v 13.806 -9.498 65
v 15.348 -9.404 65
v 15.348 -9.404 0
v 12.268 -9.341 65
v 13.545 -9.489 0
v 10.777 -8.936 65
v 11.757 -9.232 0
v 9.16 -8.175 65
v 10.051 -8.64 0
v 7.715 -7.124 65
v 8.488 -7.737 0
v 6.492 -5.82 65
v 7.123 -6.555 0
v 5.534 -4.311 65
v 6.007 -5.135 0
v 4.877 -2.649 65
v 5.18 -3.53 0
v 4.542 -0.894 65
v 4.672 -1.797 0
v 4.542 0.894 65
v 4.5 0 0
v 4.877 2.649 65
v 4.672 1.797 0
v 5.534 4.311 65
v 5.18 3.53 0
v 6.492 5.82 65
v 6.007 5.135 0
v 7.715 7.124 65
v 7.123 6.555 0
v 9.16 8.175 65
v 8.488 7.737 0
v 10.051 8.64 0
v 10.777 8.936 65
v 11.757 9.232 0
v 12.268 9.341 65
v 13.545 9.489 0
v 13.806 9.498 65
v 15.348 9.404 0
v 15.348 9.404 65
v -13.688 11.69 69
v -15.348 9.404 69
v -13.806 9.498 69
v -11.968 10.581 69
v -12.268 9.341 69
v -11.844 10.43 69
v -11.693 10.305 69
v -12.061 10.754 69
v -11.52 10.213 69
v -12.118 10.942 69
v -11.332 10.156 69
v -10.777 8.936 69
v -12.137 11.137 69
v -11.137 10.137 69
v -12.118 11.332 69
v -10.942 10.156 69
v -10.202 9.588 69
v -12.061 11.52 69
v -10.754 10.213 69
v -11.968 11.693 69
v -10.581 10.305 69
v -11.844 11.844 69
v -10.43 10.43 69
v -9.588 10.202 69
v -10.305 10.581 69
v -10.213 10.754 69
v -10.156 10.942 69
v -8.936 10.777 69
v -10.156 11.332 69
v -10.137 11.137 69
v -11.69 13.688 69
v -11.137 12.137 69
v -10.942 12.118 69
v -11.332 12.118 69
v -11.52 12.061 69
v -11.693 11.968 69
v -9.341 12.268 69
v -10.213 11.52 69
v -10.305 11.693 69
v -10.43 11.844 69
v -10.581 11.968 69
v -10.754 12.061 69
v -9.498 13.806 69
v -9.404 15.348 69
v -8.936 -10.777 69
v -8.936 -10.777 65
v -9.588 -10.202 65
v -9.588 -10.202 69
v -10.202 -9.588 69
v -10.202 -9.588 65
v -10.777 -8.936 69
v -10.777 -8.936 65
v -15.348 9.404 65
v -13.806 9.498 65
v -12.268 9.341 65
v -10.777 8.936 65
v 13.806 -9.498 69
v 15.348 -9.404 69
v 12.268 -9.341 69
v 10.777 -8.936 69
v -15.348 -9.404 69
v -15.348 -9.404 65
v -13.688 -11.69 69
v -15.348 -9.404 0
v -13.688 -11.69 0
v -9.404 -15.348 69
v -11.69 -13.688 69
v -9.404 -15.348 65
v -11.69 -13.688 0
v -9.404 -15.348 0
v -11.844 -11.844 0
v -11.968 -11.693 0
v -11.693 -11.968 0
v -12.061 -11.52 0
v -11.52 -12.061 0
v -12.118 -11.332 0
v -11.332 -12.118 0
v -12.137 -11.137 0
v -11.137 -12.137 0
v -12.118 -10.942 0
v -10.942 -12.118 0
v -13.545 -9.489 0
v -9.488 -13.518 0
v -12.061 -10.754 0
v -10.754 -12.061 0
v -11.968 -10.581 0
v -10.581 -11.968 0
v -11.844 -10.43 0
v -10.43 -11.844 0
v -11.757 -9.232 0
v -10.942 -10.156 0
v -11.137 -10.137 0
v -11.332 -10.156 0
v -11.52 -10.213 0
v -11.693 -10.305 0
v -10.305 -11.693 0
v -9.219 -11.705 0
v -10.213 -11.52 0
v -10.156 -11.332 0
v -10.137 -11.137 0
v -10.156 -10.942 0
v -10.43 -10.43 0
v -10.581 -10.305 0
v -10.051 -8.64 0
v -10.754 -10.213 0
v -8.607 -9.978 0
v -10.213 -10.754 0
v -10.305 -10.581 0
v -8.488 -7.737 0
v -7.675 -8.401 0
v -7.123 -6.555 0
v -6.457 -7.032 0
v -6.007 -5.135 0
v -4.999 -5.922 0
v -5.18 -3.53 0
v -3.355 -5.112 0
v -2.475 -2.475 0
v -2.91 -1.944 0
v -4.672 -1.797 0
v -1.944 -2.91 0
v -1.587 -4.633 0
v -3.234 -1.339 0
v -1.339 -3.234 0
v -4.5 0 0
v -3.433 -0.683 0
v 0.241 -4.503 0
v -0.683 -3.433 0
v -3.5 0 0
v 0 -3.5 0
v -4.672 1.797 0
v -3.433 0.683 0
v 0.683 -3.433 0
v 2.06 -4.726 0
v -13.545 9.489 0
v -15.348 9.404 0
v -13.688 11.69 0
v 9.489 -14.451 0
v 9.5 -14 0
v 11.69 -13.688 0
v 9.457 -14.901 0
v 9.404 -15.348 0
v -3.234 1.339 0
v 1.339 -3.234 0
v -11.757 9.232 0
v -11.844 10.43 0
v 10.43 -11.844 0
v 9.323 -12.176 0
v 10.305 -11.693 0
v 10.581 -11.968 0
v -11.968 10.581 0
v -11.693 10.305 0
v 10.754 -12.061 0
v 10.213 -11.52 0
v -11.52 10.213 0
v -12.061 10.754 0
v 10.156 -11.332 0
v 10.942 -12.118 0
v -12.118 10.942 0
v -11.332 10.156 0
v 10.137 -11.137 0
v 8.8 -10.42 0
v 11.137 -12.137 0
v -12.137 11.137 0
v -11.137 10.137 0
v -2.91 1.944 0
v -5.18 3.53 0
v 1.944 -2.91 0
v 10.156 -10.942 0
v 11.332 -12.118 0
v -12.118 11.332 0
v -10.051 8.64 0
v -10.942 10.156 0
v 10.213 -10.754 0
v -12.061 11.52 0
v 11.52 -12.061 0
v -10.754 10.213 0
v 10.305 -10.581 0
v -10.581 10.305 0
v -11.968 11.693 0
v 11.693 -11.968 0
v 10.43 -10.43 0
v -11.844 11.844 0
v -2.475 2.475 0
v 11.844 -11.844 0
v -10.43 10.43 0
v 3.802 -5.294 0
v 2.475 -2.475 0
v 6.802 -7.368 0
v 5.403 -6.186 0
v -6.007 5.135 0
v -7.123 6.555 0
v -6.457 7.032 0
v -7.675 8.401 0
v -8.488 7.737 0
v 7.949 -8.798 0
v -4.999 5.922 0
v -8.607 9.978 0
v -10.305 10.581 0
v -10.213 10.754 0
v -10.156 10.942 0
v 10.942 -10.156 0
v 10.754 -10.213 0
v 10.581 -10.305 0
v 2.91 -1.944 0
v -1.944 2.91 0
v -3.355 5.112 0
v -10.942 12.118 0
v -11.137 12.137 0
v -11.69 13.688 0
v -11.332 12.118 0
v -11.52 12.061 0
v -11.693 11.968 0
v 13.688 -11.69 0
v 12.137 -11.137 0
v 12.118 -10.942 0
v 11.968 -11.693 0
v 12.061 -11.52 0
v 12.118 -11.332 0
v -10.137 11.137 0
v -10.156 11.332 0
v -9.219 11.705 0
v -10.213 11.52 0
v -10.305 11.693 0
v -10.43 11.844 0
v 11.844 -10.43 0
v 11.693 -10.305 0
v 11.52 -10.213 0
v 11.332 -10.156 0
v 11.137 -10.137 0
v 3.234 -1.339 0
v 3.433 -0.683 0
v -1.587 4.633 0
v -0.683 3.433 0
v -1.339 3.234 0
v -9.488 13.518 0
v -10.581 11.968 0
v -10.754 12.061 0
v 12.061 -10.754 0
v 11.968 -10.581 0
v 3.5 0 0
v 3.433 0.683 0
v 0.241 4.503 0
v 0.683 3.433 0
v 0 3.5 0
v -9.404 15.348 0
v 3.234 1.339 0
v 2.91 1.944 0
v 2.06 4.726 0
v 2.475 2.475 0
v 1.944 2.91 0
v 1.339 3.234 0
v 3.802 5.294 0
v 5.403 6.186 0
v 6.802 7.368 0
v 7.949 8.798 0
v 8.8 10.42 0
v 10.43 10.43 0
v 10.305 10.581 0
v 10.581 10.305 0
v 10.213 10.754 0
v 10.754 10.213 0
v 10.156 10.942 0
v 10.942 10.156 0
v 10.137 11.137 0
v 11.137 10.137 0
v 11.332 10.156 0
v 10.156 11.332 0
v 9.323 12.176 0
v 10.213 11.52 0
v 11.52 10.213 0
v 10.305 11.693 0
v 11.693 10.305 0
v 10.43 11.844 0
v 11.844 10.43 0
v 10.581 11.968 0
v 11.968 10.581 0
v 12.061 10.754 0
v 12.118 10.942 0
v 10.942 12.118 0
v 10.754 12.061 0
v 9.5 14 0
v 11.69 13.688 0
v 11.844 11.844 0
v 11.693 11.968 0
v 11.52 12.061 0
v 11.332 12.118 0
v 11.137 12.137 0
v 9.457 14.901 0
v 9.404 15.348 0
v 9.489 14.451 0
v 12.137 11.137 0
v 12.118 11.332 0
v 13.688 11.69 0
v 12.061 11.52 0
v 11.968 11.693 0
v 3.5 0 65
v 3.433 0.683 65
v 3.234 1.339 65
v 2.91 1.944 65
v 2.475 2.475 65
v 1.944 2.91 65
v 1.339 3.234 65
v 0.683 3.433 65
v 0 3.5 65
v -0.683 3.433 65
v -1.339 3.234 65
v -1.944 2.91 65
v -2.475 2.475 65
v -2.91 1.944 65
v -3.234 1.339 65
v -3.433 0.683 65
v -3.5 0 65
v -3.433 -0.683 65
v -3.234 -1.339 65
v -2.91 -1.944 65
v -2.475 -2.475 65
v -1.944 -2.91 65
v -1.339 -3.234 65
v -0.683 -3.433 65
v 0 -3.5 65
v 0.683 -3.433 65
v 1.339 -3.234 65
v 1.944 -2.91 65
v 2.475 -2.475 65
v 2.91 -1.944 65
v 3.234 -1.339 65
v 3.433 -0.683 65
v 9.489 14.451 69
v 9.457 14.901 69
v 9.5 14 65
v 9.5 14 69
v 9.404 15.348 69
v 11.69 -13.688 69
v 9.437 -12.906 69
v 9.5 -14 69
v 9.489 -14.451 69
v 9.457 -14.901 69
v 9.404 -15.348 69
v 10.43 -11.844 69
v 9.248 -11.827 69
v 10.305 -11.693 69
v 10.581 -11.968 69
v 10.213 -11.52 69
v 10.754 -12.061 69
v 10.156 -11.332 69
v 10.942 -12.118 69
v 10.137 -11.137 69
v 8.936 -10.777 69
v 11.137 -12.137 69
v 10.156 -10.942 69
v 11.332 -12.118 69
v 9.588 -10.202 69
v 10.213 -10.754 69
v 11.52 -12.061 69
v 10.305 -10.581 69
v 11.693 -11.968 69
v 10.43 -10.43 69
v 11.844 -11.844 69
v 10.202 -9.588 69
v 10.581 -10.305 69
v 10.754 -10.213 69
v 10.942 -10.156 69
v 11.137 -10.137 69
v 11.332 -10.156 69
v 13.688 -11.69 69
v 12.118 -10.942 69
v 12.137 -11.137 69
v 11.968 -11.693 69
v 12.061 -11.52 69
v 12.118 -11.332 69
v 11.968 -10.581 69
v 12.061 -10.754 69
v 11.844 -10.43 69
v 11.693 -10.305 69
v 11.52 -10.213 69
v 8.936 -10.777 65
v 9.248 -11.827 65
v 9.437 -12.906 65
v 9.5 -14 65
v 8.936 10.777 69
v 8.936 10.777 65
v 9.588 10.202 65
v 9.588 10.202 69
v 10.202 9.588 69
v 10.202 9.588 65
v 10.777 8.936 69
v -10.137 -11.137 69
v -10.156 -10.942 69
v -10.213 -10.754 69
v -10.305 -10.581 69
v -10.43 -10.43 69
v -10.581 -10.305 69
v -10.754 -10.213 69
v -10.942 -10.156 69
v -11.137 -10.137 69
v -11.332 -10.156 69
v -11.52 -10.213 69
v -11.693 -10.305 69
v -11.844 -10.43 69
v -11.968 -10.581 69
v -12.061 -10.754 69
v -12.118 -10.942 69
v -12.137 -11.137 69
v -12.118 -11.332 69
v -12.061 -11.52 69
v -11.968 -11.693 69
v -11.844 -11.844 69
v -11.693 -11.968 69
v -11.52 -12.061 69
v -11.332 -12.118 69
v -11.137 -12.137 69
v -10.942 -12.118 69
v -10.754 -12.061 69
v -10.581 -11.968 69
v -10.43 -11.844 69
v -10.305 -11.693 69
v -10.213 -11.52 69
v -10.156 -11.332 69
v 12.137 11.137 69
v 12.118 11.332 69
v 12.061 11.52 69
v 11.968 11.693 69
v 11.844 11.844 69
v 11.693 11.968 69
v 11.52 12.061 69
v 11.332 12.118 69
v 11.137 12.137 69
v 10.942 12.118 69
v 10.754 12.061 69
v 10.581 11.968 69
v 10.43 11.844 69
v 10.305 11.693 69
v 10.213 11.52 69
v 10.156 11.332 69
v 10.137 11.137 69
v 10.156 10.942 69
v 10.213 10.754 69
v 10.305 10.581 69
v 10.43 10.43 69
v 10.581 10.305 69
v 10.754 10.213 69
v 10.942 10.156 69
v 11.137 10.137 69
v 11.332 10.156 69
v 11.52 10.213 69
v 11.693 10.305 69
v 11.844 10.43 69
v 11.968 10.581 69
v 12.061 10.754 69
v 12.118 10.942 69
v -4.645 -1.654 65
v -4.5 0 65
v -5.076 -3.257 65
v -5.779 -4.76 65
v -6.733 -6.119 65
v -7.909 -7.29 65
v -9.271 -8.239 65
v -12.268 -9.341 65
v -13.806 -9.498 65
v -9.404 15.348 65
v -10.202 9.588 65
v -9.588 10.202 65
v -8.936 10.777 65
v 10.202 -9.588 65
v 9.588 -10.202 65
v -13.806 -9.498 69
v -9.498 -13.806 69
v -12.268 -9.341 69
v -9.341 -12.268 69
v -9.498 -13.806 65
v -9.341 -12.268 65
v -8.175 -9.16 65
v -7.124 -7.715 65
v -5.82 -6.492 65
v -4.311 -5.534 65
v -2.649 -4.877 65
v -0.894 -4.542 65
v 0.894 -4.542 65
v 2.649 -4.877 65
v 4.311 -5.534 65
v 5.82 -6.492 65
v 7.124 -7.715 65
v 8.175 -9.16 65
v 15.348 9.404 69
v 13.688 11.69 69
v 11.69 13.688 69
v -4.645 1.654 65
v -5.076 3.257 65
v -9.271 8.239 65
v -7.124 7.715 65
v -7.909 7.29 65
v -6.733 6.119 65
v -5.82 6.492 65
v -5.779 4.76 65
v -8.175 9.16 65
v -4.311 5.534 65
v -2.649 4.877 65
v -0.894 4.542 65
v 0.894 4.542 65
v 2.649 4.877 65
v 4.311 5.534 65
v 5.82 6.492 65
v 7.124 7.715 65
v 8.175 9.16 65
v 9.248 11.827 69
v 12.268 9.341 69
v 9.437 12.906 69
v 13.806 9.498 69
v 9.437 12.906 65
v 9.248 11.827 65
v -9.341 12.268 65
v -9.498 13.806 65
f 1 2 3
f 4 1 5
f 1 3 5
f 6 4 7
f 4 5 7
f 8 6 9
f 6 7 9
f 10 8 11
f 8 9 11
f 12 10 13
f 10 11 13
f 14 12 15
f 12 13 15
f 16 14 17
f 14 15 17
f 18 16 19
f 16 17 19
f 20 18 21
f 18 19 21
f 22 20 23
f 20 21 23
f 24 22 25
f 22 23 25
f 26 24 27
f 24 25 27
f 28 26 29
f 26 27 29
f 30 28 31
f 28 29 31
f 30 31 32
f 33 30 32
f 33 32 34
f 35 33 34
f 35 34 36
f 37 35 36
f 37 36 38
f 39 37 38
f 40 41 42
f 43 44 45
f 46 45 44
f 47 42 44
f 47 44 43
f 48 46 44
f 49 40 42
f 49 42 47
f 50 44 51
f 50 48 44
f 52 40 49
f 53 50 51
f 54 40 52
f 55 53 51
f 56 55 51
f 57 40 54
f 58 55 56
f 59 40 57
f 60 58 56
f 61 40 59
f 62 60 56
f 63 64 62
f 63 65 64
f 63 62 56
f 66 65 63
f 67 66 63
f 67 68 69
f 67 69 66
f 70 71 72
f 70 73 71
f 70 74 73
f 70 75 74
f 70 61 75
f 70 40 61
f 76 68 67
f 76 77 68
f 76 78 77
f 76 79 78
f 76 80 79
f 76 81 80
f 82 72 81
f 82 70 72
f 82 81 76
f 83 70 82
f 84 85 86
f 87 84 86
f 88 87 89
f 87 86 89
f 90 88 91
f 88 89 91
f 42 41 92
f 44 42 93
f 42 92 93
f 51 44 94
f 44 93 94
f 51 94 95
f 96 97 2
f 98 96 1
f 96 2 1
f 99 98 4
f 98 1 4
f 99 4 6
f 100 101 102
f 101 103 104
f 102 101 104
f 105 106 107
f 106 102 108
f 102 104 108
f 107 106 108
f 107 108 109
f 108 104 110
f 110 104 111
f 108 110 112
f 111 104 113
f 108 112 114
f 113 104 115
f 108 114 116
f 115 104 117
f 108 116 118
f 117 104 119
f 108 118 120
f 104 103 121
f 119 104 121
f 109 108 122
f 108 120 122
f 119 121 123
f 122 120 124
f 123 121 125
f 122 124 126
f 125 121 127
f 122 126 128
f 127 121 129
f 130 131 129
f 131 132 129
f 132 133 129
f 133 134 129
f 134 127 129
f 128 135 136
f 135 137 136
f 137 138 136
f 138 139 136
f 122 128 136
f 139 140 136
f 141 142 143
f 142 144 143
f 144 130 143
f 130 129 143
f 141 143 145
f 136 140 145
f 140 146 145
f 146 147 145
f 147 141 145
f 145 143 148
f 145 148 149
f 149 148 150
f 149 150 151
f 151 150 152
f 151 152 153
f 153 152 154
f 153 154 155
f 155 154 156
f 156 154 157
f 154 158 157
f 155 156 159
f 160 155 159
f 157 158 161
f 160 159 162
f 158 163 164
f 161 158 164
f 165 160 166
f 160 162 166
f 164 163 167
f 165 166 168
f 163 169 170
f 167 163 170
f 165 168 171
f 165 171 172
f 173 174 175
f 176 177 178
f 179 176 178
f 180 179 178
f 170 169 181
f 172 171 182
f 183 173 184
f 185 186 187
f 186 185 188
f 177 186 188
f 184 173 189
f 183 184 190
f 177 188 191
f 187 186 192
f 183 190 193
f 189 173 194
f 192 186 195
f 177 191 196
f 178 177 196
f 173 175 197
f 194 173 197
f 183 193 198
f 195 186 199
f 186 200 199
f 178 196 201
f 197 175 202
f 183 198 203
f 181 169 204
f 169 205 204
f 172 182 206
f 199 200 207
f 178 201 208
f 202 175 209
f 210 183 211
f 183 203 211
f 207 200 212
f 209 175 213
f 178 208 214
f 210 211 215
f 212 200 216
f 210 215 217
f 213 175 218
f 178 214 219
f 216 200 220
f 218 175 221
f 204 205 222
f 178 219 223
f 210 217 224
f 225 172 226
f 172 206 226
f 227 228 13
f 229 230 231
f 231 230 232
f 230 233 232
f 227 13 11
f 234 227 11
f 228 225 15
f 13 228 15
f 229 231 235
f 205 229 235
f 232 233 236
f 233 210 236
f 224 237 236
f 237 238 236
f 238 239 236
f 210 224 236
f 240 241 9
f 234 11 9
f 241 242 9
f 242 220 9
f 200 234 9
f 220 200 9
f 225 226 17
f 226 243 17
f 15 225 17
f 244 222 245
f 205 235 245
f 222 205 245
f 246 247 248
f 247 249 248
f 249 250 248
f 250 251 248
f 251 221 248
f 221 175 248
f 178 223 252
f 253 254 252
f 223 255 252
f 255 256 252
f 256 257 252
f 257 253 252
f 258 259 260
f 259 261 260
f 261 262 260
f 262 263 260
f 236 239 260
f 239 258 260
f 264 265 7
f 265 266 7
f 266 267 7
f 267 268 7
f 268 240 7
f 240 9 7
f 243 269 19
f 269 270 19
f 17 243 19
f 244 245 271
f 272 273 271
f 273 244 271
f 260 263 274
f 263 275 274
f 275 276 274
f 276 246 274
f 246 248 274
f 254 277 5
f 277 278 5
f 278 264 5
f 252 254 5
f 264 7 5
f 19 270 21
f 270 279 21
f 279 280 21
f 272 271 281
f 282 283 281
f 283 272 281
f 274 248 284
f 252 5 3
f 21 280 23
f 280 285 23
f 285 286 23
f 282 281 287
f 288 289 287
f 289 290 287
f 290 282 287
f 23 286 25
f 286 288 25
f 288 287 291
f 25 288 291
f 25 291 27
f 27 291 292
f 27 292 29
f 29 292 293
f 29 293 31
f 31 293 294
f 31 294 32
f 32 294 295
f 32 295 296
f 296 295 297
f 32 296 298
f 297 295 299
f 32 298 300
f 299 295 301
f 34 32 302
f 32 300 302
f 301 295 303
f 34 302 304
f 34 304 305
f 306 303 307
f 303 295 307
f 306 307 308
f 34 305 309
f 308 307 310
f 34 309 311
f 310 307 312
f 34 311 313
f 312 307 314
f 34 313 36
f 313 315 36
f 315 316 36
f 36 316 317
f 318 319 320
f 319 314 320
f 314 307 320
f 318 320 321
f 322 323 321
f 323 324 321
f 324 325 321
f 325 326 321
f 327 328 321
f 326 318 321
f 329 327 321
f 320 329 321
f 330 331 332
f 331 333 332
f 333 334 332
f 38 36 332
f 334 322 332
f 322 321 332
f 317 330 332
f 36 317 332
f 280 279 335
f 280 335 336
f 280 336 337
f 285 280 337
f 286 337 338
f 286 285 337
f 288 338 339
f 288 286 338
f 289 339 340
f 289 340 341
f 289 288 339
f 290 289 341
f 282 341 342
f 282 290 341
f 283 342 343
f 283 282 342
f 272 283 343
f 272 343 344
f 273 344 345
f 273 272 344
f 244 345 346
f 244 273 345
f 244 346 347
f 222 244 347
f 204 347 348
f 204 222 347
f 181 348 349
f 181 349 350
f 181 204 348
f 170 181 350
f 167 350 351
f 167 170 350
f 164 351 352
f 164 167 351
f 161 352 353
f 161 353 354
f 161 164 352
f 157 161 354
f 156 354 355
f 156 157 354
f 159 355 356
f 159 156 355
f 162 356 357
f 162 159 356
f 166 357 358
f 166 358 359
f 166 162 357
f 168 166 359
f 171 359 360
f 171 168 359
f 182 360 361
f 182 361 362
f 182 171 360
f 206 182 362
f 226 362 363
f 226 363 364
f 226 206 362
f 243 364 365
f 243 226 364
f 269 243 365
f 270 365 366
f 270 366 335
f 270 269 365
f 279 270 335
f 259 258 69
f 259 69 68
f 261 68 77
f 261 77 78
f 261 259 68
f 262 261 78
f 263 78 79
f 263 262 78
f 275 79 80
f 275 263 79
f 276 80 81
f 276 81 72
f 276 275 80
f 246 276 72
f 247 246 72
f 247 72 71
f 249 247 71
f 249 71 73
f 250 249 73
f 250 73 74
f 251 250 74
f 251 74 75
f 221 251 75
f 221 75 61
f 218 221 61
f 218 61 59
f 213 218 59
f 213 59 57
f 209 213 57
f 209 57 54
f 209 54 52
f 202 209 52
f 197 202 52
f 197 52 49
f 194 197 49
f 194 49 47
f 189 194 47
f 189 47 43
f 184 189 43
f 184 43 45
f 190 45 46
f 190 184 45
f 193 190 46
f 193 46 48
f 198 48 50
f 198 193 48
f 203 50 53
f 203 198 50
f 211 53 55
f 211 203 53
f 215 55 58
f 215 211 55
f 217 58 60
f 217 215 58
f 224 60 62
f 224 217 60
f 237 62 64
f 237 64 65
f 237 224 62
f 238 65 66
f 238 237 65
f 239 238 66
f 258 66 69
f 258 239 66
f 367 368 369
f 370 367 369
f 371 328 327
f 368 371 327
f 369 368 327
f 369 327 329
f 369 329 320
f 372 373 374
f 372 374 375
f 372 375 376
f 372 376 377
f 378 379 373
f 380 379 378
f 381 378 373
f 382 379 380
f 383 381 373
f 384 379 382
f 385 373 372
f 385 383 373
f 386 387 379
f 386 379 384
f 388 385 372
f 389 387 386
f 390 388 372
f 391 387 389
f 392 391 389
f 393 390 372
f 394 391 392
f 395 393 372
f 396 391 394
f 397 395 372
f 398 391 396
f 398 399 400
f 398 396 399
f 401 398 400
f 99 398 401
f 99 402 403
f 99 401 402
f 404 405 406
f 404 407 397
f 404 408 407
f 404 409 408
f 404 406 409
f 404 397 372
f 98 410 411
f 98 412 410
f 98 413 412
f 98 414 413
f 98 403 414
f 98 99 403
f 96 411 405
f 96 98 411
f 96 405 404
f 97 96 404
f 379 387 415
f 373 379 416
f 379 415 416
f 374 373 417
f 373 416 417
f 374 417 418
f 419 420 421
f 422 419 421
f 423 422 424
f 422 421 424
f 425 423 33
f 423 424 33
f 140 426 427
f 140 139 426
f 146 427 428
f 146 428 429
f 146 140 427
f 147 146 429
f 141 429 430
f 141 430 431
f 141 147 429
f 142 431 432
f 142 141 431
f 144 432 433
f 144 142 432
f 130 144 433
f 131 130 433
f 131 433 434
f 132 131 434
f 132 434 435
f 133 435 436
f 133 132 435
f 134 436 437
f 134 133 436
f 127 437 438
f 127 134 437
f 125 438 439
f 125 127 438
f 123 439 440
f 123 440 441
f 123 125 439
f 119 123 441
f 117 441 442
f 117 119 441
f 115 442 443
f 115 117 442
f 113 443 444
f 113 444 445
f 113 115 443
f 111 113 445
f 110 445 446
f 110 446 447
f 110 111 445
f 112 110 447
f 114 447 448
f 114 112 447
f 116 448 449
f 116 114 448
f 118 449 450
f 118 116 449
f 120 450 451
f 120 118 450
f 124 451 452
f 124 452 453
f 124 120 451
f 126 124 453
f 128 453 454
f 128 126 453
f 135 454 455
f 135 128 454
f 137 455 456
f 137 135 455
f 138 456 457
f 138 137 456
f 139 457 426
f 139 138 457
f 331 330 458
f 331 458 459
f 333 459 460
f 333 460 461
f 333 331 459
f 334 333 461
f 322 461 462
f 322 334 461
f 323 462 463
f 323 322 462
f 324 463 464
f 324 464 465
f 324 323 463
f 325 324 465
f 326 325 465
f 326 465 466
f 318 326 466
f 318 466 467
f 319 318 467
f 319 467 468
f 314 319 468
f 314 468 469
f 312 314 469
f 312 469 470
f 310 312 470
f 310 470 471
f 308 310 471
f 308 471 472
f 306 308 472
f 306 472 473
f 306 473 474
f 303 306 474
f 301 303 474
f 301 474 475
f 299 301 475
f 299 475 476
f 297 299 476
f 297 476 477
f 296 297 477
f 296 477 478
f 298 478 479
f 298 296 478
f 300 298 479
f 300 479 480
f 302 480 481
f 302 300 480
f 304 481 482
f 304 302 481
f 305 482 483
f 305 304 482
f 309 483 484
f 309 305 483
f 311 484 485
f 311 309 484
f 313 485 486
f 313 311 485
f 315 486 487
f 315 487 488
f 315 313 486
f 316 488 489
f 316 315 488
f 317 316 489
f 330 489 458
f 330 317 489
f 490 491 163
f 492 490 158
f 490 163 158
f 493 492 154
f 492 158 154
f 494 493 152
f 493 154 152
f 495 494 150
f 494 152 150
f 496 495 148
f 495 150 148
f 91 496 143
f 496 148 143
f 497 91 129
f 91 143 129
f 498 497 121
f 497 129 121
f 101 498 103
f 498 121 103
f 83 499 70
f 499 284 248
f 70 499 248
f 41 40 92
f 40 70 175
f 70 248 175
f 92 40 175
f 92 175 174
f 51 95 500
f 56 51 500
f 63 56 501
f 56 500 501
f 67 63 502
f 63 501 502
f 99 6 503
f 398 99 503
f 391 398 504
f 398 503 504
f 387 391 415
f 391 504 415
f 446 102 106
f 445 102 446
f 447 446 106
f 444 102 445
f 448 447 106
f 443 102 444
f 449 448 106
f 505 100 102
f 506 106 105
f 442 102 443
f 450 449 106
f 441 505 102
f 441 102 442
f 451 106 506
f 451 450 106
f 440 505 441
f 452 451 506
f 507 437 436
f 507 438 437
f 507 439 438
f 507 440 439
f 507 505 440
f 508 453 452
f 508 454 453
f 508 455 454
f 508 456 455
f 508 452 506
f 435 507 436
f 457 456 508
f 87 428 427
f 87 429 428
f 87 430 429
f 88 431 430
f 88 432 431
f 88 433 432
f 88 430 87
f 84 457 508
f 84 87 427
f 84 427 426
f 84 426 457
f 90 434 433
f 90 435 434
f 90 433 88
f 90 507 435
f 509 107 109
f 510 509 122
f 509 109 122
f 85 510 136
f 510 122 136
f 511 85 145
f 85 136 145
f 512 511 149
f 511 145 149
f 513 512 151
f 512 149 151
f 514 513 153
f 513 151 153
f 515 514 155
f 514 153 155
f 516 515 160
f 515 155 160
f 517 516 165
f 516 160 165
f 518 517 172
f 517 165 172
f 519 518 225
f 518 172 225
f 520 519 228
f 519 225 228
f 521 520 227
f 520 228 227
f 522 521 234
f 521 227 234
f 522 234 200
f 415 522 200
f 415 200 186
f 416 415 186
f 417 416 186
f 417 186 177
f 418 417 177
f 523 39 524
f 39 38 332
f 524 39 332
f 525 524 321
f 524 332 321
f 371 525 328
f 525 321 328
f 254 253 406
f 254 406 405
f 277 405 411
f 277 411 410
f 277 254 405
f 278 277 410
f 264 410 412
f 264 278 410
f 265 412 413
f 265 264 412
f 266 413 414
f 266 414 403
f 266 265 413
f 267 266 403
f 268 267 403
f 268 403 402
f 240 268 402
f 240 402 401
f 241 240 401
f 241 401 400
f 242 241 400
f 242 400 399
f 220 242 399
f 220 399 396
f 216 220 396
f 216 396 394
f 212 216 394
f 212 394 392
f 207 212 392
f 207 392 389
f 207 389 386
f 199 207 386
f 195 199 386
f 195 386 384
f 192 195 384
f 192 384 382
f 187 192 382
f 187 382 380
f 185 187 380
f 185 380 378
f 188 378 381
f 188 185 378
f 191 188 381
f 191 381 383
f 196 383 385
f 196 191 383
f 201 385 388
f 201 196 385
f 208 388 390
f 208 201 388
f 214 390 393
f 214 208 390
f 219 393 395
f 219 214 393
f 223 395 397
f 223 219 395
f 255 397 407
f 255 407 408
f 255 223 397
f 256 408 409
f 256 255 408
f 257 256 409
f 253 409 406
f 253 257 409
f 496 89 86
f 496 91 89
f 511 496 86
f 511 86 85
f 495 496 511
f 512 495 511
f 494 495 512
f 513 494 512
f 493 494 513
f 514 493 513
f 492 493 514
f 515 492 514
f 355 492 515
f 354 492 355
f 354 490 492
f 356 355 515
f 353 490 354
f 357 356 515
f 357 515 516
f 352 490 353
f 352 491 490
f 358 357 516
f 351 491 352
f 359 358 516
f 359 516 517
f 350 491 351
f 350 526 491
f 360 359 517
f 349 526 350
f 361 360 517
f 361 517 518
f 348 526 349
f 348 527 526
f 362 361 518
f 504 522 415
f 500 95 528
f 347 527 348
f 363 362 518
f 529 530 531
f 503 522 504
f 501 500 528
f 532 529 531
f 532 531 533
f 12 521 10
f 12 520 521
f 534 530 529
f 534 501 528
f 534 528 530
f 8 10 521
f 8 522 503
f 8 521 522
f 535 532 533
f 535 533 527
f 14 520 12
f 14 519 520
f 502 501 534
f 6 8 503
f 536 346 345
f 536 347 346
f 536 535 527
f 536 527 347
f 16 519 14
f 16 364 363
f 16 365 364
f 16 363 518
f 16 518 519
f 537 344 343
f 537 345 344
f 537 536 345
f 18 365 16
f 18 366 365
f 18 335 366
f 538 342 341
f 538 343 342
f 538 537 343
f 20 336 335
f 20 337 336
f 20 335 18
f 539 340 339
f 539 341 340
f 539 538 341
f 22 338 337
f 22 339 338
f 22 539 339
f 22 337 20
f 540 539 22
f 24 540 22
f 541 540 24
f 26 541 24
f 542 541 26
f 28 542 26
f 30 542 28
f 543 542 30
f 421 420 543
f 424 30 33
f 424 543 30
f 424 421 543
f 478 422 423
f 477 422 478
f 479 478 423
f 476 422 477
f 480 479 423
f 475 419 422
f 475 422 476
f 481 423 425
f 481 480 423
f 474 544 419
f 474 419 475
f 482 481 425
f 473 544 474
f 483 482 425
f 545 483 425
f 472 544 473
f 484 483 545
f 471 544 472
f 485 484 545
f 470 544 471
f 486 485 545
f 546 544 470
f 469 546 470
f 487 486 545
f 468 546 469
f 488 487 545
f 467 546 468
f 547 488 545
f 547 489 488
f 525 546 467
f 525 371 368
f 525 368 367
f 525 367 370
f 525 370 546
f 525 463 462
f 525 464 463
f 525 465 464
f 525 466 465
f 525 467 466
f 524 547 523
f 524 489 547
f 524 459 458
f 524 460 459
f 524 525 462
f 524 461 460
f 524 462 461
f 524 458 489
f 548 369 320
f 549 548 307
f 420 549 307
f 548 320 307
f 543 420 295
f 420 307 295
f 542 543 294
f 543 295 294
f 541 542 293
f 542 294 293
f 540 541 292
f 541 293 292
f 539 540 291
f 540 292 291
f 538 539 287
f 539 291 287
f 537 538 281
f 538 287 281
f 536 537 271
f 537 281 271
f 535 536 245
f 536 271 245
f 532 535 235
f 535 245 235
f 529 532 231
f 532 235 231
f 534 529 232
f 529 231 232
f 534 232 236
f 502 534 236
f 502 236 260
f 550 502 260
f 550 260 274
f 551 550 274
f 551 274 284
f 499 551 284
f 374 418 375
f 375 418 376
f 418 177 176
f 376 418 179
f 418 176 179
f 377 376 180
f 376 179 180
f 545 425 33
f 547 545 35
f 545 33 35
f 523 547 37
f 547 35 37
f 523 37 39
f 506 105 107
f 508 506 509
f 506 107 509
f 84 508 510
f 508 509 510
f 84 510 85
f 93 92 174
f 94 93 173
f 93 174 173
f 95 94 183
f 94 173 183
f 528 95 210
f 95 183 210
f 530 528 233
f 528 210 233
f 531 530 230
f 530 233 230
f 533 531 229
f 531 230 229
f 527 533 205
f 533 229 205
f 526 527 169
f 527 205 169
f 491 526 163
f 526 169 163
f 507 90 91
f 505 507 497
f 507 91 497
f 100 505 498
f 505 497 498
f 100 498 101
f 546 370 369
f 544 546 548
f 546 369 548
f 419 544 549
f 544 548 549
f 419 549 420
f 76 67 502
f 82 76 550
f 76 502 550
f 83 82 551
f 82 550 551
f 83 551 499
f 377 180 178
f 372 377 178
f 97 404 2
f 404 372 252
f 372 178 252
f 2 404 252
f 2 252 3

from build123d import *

# Parameters (mm, degrees)
SKETCH_1_R      = 1
SKETCH_1_R_2    = 3.5
EXTRUDE_1_DEPTH = 65
SKETCH_2_R      = 1
EXTRUDE_2_DEPTH = 4


with BuildPart() as part:
    # Эскиз1 → Бобышка-Вытянуть1 (new body)
    with BuildSketch(Plane.XY):
        with BuildLine():
            ThreePointArc((15.348214286, -9.403845928), (4.5, 0), (15.348214286, 9.403845928))
            ThreePointArc((15.348214286, 9.403845928), (12.727922061, 12.727922061), (9.403845928, 15.348214286))
            ThreePointArc((9.403845928, 15.348214286), (9.475930992, 14.675819385), (9.5, 14))
            ThreePointArc((9.5, 14), (-0.675819385, 4.524069008), (-9.403845928, 15.348214286))
            ThreePointArc((-9.403845928, 15.348214286), (-12.727922061, 12.727922061), (-15.348214286, 9.403845928))
            ThreePointArc((-15.348214286, 9.403845928), (-7.777381408, 7.178371532), (-4.5, 0))
            ThreePointArc((-4.5, 0), (-7.777381408, -7.178371532), (-15.348214286, -9.403845928))
            ThreePointArc((-15.348214286, -9.403845928), (-12.727922061, -12.727922061), (-9.403845928, -15.348214286))
            ThreePointArc((-9.403845928, -15.348214286), (-0.675819385, -4.524069008), (9.5, -14))
            ThreePointArc((9.5, -14), (9.475930992, -14.675819385), (9.403845928, -15.348214286))
            ThreePointArc((9.403845928, -15.348214286), (12.727922061, -12.727922061), (15.348214286, -9.403845928))
        make_face()
        with Locations((-11.136931804, -11.136931804)):
            Circle(SKETCH_1_R, mode=Mode.SUBTRACT)
        with Locations((11.136931804, -11.136931804)):
            Circle(SKETCH_1_R, mode=Mode.SUBTRACT)
        Circle(SKETCH_1_R_2, mode=Mode.SUBTRACT)
        with Locations((-11.136931804, 11.136931804)):
            Circle(SKETCH_1_R, mode=Mode.SUBTRACT)
        with Locations((11.136931804, 11.136931804)):
            Circle(SKETCH_1_R, mode=Mode.SUBTRACT)
    extrude(amount=EXTRUDE_1_DEPTH)

    # Эскиз2 → Бобышка-Вытянуть2 (add)
    # profile 1 of 4: a face of its own
    with BuildSketch(Plane.XY.offset(65)):
        with BuildLine():
            ThreePointArc((-9.403845928, -15.348214286), (-9.450740121, -13.033816183), (-8.936492023, -10.776785714))
            ThreePointArc((-8.936492023, -10.776785714), (-9.899494937, -9.899494937), (-10.776785714, -8.936492023))
            ThreePointArc((-10.776785714, -8.936492023), (-13.033816183, -9.450740121), (-15.348214286, -9.403845928))
            ThreePointArc((-15.348214286, -9.403845928), (-12.727922061, -12.727922061), (-9.403845928, -15.348214286))
        make_face()
        with Locations((-11.136931804, -11.136931804)):
            Circle(SKETCH_2_R, mode=Mode.SUBTRACT)
    # profile 2 of 4: a face of its own
    with BuildSketch(Plane.XY.offset(65)):
        with BuildLine():
            ThreePointArc((15.348214286, -9.403845928), (13.033816183, -9.450740121), (10.776785714, -8.936492023))
            ThreePointArc((10.776785714, -8.936492023), (9.899494937, -9.899494937), (8.936492023, -10.776785714))
            ThreePointArc((8.936492023, -10.776785714), (9.358062679, -12.363948994), (9.5, -14))
            ThreePointArc((9.5, -14), (9.475930992, -14.675819385), (9.403845928, -15.348214286))
            ThreePointArc((9.403845928, -15.348214286), (12.727922061, -12.727922061), (15.348214286, -9.403845928))
        make_face()
        with Locations((11.136931804, -11.136931804)):
            Circle(SKETCH_2_R, mode=Mode.SUBTRACT)
    # profile 3 of 4: a face of its own
    with BuildSketch(Plane.XY.offset(65)):
        with BuildLine():
            ThreePointArc((8.936492023, 10.776785714), (9.899494937, 9.899494937), (10.776785714, 8.936492023))
            ThreePointArc((10.776785714, 8.936492023), (13.033816183, 9.450740121), (15.348214286, 9.403845928))
            ThreePointArc((15.348214286, 9.403845928), (12.727922061, 12.727922061), (9.403845928, 15.348214286))
            ThreePointArc((9.403845928, 15.348214286), (9.475930992, 14.675819385), (9.5, 14))
            ThreePointArc((9.5, 14), (9.358062679, 12.363948994), (8.936492023, 10.776785714))
        make_face()
        with Locations((11.136931804, 11.136931804)):
            Circle(SKETCH_2_R, mode=Mode.SUBTRACT)
    # profile 4 of 4: a face of its own
    with BuildSketch(Plane.XY.offset(65)):
        with BuildLine():
            ThreePointArc((-10.776785714, 8.936492023), (-9.899494937, 9.899494937), (-8.936492023, 10.776785714))
            ThreePointArc((-8.936492023, 10.776785714), (-9.450740121, 13.033816183), (-9.403845928, 15.348214286))
            ThreePointArc((-9.403845928, 15.348214286), (-12.727922061, 12.727922061), (-15.348214286, 9.403845928))
            ThreePointArc((-15.348214286, 9.403845928), (-13.033816183, 9.450740121), (-10.776785714, 8.936492023))
        make_face()
        with Locations((-11.136931804, 11.136931804)):
            Circle(SKETCH_2_R, mode=Mode.SUBTRACT)
    extrude(amount=EXTRUDE_2_DEPTH)


solid = part.part
